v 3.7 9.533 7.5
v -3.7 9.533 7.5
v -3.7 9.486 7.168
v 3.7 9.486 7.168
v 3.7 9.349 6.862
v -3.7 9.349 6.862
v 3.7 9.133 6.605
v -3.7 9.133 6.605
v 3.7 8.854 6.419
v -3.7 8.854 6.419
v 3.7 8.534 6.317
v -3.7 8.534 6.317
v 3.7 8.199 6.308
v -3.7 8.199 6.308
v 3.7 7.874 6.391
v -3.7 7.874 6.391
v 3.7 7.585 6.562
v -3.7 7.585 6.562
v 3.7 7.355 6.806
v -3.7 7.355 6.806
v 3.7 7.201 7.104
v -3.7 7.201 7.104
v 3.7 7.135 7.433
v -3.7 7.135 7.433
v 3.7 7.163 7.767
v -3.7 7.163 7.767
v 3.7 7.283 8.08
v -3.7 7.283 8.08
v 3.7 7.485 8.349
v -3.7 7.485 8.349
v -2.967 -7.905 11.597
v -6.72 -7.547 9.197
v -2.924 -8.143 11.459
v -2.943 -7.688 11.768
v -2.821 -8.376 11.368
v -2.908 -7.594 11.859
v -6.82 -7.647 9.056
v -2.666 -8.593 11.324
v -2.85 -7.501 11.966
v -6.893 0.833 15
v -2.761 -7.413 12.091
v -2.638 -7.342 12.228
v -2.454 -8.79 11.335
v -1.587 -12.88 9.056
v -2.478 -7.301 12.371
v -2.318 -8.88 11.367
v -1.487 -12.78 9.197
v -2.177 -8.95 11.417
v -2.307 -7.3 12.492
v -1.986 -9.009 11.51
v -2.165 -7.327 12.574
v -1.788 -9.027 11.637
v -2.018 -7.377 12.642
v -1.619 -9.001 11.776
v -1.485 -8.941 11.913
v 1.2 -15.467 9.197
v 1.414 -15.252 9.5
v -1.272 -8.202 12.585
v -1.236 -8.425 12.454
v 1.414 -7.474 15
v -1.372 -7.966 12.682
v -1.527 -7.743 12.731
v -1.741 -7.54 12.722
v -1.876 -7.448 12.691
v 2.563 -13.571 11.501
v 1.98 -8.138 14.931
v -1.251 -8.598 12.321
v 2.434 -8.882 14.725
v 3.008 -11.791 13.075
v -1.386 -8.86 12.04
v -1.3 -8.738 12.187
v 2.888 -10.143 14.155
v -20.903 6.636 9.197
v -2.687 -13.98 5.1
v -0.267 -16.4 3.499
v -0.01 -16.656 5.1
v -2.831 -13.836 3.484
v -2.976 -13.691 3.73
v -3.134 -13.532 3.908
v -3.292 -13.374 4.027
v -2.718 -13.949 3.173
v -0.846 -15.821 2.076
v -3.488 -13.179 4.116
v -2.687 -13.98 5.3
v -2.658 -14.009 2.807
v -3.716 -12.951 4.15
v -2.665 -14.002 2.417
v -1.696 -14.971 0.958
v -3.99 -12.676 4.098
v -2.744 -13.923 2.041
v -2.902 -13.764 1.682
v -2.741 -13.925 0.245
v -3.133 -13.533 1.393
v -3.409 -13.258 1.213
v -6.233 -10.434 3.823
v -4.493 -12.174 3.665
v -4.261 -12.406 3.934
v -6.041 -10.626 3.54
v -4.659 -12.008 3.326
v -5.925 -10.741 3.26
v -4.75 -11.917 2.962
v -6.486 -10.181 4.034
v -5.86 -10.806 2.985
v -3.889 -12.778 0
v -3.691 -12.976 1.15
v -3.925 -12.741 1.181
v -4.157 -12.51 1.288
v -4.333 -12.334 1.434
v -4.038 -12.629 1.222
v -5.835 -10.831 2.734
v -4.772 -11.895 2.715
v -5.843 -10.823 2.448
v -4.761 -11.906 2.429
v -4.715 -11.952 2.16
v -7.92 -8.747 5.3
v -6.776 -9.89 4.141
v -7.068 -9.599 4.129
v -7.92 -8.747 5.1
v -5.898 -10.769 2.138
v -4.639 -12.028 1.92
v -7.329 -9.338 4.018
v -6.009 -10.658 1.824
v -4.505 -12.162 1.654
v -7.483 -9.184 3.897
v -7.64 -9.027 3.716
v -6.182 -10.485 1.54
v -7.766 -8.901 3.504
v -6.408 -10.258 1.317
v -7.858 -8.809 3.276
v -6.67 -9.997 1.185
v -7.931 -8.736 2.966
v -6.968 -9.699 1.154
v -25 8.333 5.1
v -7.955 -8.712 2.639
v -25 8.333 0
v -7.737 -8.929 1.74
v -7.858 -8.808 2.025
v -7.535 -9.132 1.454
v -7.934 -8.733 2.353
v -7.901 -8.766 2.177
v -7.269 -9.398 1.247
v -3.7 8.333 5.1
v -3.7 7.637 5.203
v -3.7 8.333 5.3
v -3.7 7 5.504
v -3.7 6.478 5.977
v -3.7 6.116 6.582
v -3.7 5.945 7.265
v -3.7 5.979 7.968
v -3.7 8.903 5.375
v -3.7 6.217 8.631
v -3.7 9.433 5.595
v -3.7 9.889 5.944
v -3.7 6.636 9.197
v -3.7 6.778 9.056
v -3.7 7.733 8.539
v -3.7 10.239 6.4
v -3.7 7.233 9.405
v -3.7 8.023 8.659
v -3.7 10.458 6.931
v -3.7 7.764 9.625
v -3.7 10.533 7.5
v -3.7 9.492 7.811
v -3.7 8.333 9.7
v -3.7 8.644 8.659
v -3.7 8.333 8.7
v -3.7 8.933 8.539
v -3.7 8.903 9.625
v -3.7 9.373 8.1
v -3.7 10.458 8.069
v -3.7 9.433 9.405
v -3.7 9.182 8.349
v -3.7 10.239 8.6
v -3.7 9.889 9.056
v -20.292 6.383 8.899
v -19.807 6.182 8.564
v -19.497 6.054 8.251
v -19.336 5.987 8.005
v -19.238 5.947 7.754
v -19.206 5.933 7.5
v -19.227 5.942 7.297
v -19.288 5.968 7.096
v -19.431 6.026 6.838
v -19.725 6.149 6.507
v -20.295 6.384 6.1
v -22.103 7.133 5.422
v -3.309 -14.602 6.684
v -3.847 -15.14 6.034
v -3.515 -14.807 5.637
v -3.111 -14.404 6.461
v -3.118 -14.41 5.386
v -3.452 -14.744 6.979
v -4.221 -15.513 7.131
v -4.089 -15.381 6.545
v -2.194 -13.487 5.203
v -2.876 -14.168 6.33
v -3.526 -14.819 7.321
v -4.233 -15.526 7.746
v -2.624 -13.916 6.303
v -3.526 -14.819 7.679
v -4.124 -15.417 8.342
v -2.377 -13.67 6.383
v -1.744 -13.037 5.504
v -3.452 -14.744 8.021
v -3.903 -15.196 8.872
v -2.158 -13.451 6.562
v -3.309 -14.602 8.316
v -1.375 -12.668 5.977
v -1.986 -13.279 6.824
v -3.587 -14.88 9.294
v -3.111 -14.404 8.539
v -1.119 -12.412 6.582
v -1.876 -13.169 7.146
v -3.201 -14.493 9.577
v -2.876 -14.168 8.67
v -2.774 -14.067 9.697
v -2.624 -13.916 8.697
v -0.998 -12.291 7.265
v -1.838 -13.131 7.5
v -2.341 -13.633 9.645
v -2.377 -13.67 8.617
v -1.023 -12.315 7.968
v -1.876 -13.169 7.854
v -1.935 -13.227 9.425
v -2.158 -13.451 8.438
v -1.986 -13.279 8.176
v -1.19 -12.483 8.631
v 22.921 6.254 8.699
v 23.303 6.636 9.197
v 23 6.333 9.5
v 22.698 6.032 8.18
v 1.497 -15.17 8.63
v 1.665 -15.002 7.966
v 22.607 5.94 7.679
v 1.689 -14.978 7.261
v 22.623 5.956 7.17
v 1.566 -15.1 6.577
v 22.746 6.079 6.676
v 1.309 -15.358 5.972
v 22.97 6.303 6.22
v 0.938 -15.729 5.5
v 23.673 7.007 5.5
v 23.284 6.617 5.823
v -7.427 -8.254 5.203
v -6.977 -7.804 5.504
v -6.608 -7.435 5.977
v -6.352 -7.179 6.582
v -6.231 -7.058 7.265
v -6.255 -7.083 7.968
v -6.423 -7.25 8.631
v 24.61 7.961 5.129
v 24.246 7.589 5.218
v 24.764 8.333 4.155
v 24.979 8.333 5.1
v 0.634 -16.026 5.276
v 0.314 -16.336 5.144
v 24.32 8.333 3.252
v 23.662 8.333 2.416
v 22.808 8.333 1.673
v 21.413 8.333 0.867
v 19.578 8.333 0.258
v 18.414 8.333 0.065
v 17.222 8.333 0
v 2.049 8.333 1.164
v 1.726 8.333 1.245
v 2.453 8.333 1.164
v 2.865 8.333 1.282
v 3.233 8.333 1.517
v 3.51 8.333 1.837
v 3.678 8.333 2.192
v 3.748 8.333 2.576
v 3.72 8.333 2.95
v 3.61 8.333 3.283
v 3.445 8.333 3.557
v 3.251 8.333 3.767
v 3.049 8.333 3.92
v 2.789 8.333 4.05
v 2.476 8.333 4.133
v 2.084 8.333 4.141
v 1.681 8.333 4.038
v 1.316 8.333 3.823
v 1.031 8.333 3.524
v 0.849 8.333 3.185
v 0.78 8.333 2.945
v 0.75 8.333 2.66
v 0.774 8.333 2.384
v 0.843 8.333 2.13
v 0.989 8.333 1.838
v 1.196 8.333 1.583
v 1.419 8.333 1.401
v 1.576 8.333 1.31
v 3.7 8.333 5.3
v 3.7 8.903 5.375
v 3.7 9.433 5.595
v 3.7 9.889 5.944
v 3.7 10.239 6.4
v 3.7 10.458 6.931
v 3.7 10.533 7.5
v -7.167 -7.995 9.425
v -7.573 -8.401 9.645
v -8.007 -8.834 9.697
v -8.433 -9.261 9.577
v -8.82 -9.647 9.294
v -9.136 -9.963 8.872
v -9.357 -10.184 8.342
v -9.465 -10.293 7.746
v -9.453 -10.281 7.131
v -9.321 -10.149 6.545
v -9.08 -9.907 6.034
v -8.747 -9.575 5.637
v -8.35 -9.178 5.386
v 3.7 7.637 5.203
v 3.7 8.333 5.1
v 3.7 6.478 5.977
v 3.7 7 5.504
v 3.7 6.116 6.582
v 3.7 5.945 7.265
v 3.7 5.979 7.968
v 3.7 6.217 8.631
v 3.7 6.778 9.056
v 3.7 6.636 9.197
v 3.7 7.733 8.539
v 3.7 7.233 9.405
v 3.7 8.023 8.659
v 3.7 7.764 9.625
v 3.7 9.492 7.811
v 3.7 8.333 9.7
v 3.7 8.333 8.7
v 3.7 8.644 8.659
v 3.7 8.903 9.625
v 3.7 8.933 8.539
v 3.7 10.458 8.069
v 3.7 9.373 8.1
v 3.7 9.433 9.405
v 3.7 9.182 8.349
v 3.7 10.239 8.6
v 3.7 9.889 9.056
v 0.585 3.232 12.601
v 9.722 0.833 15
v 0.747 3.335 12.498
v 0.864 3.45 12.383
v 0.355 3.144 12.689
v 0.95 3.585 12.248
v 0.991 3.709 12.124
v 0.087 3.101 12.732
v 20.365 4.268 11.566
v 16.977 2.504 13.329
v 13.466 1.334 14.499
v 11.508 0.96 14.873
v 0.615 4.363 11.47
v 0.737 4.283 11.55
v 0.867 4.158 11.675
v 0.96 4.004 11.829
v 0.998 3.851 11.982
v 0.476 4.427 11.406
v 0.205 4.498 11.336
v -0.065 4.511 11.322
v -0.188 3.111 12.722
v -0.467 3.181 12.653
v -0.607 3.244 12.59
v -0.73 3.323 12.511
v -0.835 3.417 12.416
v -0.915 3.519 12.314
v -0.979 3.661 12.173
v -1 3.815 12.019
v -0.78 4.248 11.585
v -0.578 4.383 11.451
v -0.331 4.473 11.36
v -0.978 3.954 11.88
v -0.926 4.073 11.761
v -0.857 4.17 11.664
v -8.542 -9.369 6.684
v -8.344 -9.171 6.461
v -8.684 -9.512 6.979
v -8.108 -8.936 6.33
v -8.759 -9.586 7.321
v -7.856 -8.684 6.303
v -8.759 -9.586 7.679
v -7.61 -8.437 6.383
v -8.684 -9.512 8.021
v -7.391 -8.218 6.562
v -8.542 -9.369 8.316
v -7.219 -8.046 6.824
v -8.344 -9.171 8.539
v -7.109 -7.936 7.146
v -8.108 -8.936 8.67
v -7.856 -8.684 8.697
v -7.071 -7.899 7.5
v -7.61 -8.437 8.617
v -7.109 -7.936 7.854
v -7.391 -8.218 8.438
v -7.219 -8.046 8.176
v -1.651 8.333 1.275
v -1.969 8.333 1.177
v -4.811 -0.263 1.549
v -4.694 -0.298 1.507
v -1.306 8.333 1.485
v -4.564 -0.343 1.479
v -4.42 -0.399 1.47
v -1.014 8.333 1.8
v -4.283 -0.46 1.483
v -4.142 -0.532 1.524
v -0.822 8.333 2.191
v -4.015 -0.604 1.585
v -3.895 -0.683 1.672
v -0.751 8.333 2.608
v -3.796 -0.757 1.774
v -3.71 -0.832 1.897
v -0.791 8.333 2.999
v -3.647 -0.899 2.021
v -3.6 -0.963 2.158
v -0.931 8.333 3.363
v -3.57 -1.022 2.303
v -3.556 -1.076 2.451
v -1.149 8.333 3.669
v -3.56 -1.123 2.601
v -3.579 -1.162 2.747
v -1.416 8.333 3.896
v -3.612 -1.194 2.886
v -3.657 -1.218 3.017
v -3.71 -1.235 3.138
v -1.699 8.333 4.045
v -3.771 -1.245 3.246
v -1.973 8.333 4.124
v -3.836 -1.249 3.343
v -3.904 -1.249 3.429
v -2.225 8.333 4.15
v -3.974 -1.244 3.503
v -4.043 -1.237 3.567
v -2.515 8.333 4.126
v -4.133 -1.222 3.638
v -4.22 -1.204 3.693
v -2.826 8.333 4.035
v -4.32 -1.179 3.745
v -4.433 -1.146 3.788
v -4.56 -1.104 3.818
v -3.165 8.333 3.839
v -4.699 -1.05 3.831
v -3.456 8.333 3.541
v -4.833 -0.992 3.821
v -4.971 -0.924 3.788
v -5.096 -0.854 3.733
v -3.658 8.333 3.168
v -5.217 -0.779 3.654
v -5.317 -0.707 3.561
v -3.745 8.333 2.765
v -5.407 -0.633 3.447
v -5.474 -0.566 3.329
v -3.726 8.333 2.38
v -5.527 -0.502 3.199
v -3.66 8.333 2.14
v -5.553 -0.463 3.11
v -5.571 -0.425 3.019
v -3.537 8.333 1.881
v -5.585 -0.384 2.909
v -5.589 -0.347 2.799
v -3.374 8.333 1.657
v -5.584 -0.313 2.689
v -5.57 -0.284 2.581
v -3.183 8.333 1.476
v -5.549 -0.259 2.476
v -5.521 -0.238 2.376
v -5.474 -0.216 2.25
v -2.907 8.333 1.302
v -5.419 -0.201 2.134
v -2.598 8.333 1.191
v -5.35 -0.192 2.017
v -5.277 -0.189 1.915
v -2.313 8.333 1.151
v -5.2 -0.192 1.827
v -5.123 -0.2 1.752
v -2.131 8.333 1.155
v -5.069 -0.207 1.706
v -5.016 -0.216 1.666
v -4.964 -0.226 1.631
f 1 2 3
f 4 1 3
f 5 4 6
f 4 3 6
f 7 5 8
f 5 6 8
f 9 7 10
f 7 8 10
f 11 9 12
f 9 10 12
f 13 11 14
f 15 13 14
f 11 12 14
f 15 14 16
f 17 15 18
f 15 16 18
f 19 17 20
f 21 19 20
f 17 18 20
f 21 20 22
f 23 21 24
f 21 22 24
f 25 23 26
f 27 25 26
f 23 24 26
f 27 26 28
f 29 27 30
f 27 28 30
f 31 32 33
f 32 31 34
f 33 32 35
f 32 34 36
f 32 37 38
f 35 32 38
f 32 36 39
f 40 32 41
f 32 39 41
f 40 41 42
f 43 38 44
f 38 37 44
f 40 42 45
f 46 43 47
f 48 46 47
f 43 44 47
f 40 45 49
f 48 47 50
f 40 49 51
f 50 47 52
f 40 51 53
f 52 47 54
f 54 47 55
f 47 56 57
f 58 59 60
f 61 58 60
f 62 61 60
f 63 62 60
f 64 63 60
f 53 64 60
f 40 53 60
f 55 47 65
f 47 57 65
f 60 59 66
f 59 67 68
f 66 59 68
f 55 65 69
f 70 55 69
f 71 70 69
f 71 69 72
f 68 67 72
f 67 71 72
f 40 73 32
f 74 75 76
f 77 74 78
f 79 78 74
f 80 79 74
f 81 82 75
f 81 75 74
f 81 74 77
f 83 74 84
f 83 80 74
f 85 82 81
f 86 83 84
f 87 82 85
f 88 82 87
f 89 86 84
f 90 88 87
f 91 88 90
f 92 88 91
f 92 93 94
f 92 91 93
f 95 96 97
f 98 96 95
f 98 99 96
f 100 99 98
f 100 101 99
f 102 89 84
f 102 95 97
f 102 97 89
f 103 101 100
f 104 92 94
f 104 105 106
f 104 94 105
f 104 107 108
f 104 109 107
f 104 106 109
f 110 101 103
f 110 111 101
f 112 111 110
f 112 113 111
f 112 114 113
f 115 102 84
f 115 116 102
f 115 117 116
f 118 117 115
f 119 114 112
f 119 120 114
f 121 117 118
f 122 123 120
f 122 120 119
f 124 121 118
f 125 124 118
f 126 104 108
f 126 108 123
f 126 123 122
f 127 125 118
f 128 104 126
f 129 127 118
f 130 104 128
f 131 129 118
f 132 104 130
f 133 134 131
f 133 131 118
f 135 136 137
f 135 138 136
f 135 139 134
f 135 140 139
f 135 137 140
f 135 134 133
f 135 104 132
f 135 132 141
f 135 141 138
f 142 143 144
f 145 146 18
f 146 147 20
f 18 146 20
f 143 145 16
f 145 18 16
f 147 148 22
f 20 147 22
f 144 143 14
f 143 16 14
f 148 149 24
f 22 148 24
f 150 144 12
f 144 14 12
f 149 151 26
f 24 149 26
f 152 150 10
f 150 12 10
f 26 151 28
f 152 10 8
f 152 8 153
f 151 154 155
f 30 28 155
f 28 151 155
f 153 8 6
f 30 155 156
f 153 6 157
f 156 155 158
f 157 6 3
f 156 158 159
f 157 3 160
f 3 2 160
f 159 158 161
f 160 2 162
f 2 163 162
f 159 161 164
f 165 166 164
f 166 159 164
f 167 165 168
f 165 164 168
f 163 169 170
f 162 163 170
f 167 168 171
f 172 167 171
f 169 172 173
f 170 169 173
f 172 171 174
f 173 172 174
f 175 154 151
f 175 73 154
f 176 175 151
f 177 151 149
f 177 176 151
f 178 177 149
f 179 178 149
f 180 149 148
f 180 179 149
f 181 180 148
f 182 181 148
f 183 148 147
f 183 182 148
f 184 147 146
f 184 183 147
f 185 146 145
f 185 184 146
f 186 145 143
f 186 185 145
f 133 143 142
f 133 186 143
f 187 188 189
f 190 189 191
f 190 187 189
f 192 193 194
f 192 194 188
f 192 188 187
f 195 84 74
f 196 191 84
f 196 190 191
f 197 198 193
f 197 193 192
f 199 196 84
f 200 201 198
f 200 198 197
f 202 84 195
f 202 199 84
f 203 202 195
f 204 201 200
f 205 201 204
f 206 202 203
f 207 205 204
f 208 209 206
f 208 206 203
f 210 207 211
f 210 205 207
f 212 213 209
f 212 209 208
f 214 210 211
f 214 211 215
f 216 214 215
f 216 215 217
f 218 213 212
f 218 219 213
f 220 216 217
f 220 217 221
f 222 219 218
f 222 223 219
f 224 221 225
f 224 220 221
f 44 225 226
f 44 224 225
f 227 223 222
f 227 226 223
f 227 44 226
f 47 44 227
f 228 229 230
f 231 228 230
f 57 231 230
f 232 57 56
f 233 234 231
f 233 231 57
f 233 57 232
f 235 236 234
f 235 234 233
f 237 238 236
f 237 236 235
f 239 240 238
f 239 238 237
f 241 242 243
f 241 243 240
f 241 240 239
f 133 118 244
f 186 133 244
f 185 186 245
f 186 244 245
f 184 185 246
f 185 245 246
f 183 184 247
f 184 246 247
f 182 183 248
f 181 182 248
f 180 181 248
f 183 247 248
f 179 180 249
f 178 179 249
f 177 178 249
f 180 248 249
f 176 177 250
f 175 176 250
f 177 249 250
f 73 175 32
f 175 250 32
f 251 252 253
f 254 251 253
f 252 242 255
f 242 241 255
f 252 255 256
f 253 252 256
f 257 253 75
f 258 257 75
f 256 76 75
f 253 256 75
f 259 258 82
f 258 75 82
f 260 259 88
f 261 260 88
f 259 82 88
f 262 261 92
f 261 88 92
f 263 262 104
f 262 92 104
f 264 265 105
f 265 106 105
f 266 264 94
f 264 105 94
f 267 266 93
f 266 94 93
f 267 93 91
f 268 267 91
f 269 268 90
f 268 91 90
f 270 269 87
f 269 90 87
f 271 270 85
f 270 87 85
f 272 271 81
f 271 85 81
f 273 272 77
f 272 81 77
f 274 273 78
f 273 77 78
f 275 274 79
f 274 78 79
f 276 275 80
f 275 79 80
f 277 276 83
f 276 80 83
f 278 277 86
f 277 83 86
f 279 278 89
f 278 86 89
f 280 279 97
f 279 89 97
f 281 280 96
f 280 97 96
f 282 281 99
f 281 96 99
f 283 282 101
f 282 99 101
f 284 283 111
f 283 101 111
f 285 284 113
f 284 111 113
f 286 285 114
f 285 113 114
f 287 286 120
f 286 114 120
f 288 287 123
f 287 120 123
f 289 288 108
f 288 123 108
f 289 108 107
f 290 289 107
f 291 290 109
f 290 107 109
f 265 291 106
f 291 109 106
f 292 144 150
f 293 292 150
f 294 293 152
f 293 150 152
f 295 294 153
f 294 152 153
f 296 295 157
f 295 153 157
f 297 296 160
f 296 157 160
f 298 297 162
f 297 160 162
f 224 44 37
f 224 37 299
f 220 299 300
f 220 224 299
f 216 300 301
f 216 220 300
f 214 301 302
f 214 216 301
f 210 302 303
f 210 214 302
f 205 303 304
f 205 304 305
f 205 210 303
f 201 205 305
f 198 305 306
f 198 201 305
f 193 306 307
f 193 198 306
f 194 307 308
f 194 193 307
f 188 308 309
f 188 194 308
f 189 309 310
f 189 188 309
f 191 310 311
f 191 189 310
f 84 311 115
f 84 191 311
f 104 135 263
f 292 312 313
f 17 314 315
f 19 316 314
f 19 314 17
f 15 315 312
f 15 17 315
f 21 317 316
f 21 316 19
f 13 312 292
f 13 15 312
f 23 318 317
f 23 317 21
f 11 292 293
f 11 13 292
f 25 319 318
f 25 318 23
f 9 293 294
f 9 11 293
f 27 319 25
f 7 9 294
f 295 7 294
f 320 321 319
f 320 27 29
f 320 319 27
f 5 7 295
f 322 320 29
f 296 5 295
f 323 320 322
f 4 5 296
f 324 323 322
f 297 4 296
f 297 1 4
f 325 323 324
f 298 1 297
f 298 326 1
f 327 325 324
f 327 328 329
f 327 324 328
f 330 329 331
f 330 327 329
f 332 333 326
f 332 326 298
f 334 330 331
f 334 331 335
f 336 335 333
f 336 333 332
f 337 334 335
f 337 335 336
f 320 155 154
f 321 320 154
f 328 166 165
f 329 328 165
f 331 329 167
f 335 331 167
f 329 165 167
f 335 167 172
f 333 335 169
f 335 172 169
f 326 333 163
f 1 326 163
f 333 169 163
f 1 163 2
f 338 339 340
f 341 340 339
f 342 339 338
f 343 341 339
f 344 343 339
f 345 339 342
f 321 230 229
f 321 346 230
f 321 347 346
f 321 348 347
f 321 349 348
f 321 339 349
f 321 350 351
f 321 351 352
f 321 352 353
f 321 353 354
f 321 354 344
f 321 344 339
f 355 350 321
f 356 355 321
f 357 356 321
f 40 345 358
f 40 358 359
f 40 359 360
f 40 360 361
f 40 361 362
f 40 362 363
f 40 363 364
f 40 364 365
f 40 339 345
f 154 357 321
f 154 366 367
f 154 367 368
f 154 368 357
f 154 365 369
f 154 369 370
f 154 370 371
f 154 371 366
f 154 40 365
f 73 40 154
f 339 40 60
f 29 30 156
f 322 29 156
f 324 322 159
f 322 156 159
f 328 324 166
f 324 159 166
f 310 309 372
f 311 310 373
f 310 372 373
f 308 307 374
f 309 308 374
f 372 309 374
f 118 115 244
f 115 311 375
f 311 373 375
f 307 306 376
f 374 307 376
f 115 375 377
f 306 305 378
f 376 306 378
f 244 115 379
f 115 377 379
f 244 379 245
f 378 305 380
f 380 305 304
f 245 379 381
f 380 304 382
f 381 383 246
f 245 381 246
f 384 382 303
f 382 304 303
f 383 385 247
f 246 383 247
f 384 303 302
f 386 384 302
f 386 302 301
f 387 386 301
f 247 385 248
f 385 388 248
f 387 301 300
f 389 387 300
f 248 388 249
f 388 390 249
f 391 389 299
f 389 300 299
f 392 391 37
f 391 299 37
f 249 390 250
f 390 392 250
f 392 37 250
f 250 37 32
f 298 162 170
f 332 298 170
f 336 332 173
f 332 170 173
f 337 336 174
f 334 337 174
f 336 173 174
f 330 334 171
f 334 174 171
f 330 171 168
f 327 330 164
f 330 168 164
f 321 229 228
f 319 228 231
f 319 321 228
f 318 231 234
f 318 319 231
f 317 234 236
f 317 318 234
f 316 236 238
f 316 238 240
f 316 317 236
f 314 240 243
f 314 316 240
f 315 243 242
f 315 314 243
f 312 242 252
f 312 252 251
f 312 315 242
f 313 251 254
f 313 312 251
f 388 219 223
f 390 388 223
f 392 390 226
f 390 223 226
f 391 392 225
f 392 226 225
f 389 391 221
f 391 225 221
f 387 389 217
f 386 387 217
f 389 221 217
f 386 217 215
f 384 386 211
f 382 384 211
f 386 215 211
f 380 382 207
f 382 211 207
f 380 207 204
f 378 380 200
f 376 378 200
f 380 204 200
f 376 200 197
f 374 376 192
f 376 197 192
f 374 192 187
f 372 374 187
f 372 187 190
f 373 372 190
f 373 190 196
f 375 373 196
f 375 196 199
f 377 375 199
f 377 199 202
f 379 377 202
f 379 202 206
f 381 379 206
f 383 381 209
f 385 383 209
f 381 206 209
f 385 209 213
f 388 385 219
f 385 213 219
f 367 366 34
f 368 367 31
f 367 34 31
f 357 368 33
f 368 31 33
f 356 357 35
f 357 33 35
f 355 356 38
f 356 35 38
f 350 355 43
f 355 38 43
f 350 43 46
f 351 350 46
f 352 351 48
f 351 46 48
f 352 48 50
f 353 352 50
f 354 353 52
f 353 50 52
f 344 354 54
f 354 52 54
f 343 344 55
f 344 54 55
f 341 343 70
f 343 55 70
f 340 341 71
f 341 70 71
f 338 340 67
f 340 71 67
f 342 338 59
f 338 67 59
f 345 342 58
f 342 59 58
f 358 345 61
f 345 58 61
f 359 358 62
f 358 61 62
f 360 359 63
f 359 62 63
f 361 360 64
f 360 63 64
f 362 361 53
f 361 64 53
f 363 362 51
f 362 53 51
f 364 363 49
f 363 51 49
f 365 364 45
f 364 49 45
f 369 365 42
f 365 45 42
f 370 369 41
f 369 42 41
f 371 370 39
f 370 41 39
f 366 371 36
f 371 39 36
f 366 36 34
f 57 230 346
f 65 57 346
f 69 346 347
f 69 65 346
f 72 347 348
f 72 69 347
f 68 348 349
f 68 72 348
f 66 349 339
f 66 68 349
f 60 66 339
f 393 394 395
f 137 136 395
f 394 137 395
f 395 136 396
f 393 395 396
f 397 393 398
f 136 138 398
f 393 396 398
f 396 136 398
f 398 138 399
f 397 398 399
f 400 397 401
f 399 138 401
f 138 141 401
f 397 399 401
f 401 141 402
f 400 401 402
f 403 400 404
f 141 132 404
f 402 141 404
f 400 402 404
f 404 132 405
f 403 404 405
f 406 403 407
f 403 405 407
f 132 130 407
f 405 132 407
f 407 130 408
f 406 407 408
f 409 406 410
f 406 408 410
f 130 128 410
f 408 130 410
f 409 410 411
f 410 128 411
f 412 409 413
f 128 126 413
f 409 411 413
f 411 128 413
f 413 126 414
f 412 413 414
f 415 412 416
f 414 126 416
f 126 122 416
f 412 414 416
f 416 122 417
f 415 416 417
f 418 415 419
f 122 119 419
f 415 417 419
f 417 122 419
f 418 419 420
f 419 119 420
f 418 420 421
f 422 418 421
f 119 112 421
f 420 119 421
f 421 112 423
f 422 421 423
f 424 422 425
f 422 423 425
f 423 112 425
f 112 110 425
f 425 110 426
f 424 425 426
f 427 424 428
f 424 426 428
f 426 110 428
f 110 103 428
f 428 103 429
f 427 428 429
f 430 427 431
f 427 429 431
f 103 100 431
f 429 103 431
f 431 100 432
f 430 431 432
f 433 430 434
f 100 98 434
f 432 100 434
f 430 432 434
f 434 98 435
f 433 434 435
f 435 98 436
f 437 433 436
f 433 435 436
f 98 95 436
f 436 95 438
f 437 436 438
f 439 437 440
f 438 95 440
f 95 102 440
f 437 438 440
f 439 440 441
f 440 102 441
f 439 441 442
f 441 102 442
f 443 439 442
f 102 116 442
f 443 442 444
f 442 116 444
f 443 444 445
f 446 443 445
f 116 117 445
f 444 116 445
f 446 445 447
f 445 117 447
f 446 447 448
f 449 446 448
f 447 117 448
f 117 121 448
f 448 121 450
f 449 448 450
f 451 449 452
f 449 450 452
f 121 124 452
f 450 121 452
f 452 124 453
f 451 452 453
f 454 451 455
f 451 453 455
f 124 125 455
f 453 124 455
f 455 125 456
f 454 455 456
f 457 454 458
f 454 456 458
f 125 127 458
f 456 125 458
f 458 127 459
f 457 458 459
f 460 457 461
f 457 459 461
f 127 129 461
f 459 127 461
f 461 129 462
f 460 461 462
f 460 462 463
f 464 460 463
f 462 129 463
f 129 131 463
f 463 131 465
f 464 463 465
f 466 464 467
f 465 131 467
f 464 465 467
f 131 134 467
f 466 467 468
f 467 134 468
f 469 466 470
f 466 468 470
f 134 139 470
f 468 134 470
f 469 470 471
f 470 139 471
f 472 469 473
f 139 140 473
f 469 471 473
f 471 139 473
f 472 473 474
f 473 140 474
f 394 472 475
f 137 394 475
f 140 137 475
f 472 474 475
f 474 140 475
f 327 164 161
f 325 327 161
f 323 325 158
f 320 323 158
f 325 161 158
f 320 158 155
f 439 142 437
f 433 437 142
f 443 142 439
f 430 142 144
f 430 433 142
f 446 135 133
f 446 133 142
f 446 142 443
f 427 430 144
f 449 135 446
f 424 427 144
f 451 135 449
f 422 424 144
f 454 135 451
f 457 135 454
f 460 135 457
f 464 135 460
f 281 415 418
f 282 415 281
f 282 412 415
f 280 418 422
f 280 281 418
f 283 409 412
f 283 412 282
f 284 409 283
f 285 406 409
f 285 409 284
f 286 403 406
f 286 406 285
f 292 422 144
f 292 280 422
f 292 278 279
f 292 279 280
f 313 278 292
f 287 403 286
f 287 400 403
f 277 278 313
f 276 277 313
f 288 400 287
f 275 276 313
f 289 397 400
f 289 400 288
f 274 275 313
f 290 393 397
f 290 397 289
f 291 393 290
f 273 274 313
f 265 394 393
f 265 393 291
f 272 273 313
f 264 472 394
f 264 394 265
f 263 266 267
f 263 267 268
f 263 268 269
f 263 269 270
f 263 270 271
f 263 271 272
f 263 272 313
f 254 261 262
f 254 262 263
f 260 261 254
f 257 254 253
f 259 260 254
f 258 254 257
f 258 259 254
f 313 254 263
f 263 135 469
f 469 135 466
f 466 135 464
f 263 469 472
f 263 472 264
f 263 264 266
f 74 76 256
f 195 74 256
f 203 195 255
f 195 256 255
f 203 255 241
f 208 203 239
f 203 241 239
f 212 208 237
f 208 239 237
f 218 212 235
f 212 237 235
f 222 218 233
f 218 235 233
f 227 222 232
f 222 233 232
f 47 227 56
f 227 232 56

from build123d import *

# Parameters (mm, degrees)
BOSS_EXTRUDE1_DEPTH      = 15
CUT_EXTRUDE1_DEPTH       = 34.582402799
CUT_EXTRUDE1_DEPTH_BACK  = 34.582402799
SKETCH2_R                = 2.4
BOSS_EXTRUDE2_DEPTH      = 3.7
BOSS_EXTRUDE2_DEPTH_BACK = 3.7
SKETCH4_R                = 2.4
SKETCH4_R_2              = 2.2
SKETCH4_R_3              = 1.2
CUT_EXTRUDE2_DEPTH       = 42.134683932
BOSS_EXTRUDE3_START      = -3.8
SKETCH4_3_R              = 1.2
BOSS_EXTRUDE3_DEPTH      = 7.4
FILLET1_R                = 5.5
FILLET2_R                = 5.5


with BuildPart() as part:
    # Sketch1 → Boss-Extrude1 (new body)
    with BuildSketch(Plane(origin=(0, 0, 0), x_dir=(0, 1, 0), z_dir=(0, 0, 1))):
        Polygon((8.333333333, 25), (8.333333333, -25), (-16.666666667, 0), align=None)
    extrude(amount=BOSS_EXTRUDE1_DEPTH)

    # Sketch2 → Cut-Extrude1 (cut, two sides: drawn at the far end of the back side and taken through both)
    with BuildSketch(Plane.YZ.offset(-CUT_EXTRUDE1_DEPTH_BACK)):
        with Locations((8.333333333, 7.5)):
            Circle(SKETCH2_R)
        Polygon((8.333333333, 7.5), (8.333333333, 15), (0.833333333, 15), align=None)
        with BuildLine():
            ThreePointArc((8.333333333, 9.9), (7.414893096, 9.717310878), (6.636277058, 9.197056275))
            Line((6.636277058, 9.197056275), (6.777698415, 9.055634919))
            ThreePointArc((6.777698415, 9.055634919), (7.491429782, 9.532534972), (8.333333333, 9.7))
            Line((8.333333333, 9.7), (8.333333333, 9.9))
        make_face()
        with BuildLine():
            ThreePointArc((8.333333333, 9.7), (7.491429782, 9.532534972), (6.777698415, 9.055634919))
            Line((6.777698415, 9.055634919), (7.484805196, 8.348528137))
            ThreePointArc((7.484805196, 8.348528137), (7.874113214, 8.608655439), (8.333333333, 8.7))
            Line((8.333333333, 8.7), (8.333333333, 9.7))
        make_face()
        with BuildLine():
            Line((7.484805196, 8.348528137), (6.777698415, 9.055634919))
            ThreePointArc((6.777698415, 9.055634919), (6.300798362, 6.658096449), (8.333333333, 5.3))
            ThreePointArc((8.333333333, 5.3), (9.888968252, 5.944365081), (10.533333333, 7.5))
            ThreePointArc((10.533333333, 7.5), (9.888968252, 9.055634919), (8.333333333, 9.7))
            Line((8.333333333, 9.7), (8.333333333, 8.7))
            ThreePointArc((8.333333333, 8.7), (9.181861471, 8.348528137), (9.533333333, 7.5))
            ThreePointArc((9.533333333, 7.5), (7.874113214, 6.391344561), (7.484805196, 8.348528137))
        make_face()
        with BuildLine():
            ThreePointArc((8.333333333, 8.7), (7.874113214, 8.608655439), (7.484805196, 8.348528137))
            Line((7.484805196, 8.348528137), (8.333333333, 7.5))
            Line((8.333333333, 7.5), (8.333333333, 8.7))
        make_face()
        with BuildLine():
            Line((8.333333333, 7.5), (7.484805196, 8.348528137))
            ThreePointArc((7.484805196, 8.348528137), (7.874113214, 6.391344561), (9.533333333, 7.5))
            ThreePointArc((9.533333333, 7.5), (9.181861471, 8.348528137), (8.333333333, 8.7))
            Line((8.333333333, 8.7), (8.333333333, 7.5))
        make_face()
    extrude(amount=CUT_EXTRUDE1_DEPTH + CUT_EXTRUDE1_DEPTH_BACK, mode=Mode.SUBTRACT)

    # Sketch2<5> → Boss-Extrude2 (add, two sides: drawn at the far end of the back side and taken through both)
    with BuildSketch(Plane.YZ.offset(-BOSS_EXTRUDE2_DEPTH_BACK)):
        with BuildLine():
            Line((6.777698415, 9.055634919), (6.636277058, 9.197056275))
            ThreePointArc((6.636277058, 9.197056275), (6.116022455, 6.581559762), (8.333333333, 5.1))
            Line((8.333333333, 5.1), (8.333333333, 5.3))
            ThreePointArc((8.333333333, 5.3), (6.300798362, 6.658096449), (6.777698415, 9.055634919))
        make_face()
        with BuildLine():
            ThreePointArc((8.333333333, 9.7), (7.491429782, 9.532534972), (6.777698415, 9.055634919))
            Line((6.777698415, 9.055634919), (7.484805196, 8.348528137))
            ThreePointArc((7.484805196, 8.348528137), (7.874113214, 8.608655439), (8.333333333, 8.7))
            Line((8.333333333, 8.7), (8.333333333, 9.7))
        make_face()
        with BuildLine():
            Line((7.484805196, 8.348528137), (6.777698415, 9.055634919))
            ThreePointArc((6.777698415, 9.055634919), (6.300798362, 6.658096449), (8.333333333, 5.3))
            ThreePointArc((8.333333333, 5.3), (9.888968252, 5.944365081), (10.533333333, 7.5))
            ThreePointArc((10.533333333, 7.5), (9.888968252, 9.055634919), (8.333333333, 9.7))
            Line((8.333333333, 9.7), (8.333333333, 8.7))
            ThreePointArc((8.333333333, 8.7), (9.181861471, 8.348528137), (9.533333333, 7.5))
            ThreePointArc((9.533333333, 7.5), (7.874113214, 6.391344561), (7.484805196, 8.348528137))
        make_face()
    extrude(amount=BOSS_EXTRUDE2_DEPTH + BOSS_EXTRUDE2_DEPTH_BACK)

    # Sketch4 → Cut-Extrude2 (cut, through all)
    # profile 1 of 3: a face of its own
    with BuildSketch(Plane(origin=(8.333333333, -8.333333333, 0), x_dir=(0.7071067811865486, 0.7071067811865465, 0), z_dir=(0.7071067811865465, -0.7071067811865486, 0))):
        with Locations((-11.78511302, 7.5)):
            Circle(SKETCH4_R)
        with Locations((-11.78511302, 7.5)):
            Circle(SKETCH4_R_2, mode=Mode.SUBTRACT)
    # profile 2 of 3: a face of its own
    with BuildSketch(Plane(origin=(8.333333333, -8.333333333, 0), x_dir=(0.7071067811865486, 0.7071067811865465, 0), z_dir=(0.7071067811865465, -0.7071067811865486, 0))):
        with Locations((-11.78511302, 7.5)):
            Circle(SKETCH4_R_3)
    # profile 3 of 3: a face of its own
    with BuildSketch(Plane(origin=(8.333333333, -8.333333333, 0), x_dir=(0.7071067811865486, 0.7071067811865465, 0), z_dir=(0.7071067811865465, -0.7071067811865486, 0))):
        Polygon((-11.78511302, 7.5), (-4.28511302, 15), (-11.78511302, 15), align=None)
    extrude(amount=-CUT_EXTRUDE2_DEPTH, mode=Mode.SUBTRACT)


with BuildPart() as cut_extrude2_kept_piece:
    # of the separate pieces the step leaves, the one the design keeps (cut_extrude2_pieces_kept)
    add(part.part.solids().sort_by_distance((-25, 8.333333333, 0))[0])

    # Sketch4<3> → Boss-Extrude3 (add)
    with BuildSketch(Plane(origin=(8.333333333, -8.333333333, 0), x_dir=(0.7071067811865486, 0.7071067811865465, 0), z_dir=(0.7071067811865465, -0.7071067811865486, 0)).offset(BOSS_EXTRUDE3_START)):
        with BuildLine():
            Line((-11.78511302, 5.3), (-11.78511302, 5.1))
            ThreePointArc((-11.78511302, 5.1), (-9.567802142, 6.581559762), (-10.088056745, 9.197056275))
            Line((-10.088056745, 9.197056275), (-10.229478101, 9.055634919))
            ThreePointArc((-10.229478101, 9.055634919), (-13.817647991, 8.341903551), (-11.78511302, 5.3))
        make_face()
        with Locations((-11.78511302, 7.5)):
            Circle(SKETCH4_3_R, mode=Mode.SUBTRACT)
    extrude(amount=-BOSS_EXTRUDE3_DEPTH)

    # Fillet1
    fillet1_edges = [cut_extrude2_kept_piece.edges().sort_by_distance(p)[0] for p in [
        (12.5, -4.166666667, 0),
    ]]
    fillet(fillet1_edges, radius=FILLET1_R)

    # Fillet2
    fillet2_edges = [cut_extrude2_kept_piece.edges().sort_by_distance(p)[0] for p in [
        (11.401650429, -5.265016237, 15),
    ]]
    fillet(fillet2_edges, radius=FILLET2_R)

    # Cut-Loft1: read off the stored shape, not the designer's step
    # Cut-Loft1: loft between two sections, ruled curve by curve
    cut_loft1_from = [
        Edge.make_bspline([(-0.780037402, 4.247975845, 11.585357488), (-0.727892994, 4.29393999, 11.539393344), (-0.661002861, 4.341451036, 11.491882298), (-0.486258531, 4.427982909, 11.405350424), (-0.37773802, 4.466988385, 11.366344948), (-0.119442352, 4.513863, 11.319470333), (0.030886977, 4.520936001, 11.312397333), (0.339194689, 4.479887019, 11.353446314), (0.495726658, 4.430828939, 11.402504394), (0.755739125, 4.283342282, 11.549991051), (0.85742023, 4.185934374, 11.647398959), (0.980967134, 3.982022818, 11.851310515), (1.003811506, 3.876720642, 11.956612691), (0.995127807, 3.688258836, 12.145074497), (0.964819046, 3.604889374, 12.22844396), (0.883263184, 3.465498283, 12.367835051), (0.832181809, 3.409020048, 12.424313286), (0.727892994, 3.317091758, 12.516241575), (0.661002861, 3.269580712, 12.563752621), (0.486258531, 3.183048839, 12.650284494), (0.37773802, 3.144043363, 12.68928997), (0.119442352, 3.097168748, 12.736164585), (-0.030886977, 3.090095747, 12.743237586), (-0.339194689, 3.131144729, 12.702188605), (-0.495726658, 3.180202809, 12.653130524), (-0.755739125, 3.327689466, 12.505643867), (-0.85742023, 3.425097374, 12.40823596), (-0.980967134, 3.62900893, 12.204324403), (-1.003811506, 3.734311106, 12.099022227), (-0.995127807, 3.922772912, 11.910560421), (-0.964819046, 4.006142375, 11.827190959), (-0.883263184, 4.145533465, 11.687799868), (-0.832181809, 4.2020117, 11.631321633), (-0.780037402, 4.247975845, 11.585357488)], [0, 0, 0, 0, 0.0625, 0.0625, 0.125, 0.125, 0.1875, 0.1875, 0.25, 0.25, 0.3125, 0.3125, 0.375, 0.375, 0.4375, 0.4375, 0.5, 0.5, 0.5625, 0.5625, 0.625, 0.625, 0.6875, 0.6875, 0.75, 0.75, 0.8125, 0.8125, 0.875, 0.875, 0.9375, 0.9375, 1, 1, 1, 1], 3),
    ]
    cut_loft1_to = [
        Edge.make_bspline([(-2.942962207, -7.687612903, 11.768161272), (-2.960079955, -7.748006682, 11.713352345), (-2.97091826, -7.821128364, 11.653983669), (-2.962732482, -7.997871839, 11.534795379), (-2.943341865, -8.102036376, 11.474851165), (-2.852553416, -8.332500848, 11.376085302), (-2.780090013, -8.458954557, 11.33790839), (-2.577527193, -8.697189205, 11.312684599), (-2.447282041, -8.807423656, 11.326834302), (-2.166844782, -8.965457814, 11.413386364), (-2.018593417, -9.01216386, 11.485189748), (-1.75537809, -9.036408091, 11.65416783), (-1.641064457, -9.015208413, 11.749990212), (-1.462633136, -8.936456733, 11.931846055), (-1.397668226, -8.879828871, 12.017825129), (-1.30534529, -8.759724839, 12.168033678), (-1.2774564, -8.696211634, 12.23266472), (-1.243220903, -8.575424074, 12.342282574), (-1.232382599, -8.502302392, 12.40165125), (-1.240568377, -8.325558918, 12.52083954), (-1.259958994, -8.221394381, 12.580783753), (-1.350747443, -7.990929909, 12.679549617), (-1.423210846, -7.8644762, 12.717726528), (-1.625773666, -7.626241552, 12.74295032), (-1.756018818, -7.516007101, 12.728800617), (-2.036456077, -7.357972942, 12.642248555), (-2.184707442, -7.311266897, 12.570445171), (-2.447922769, -7.287022665, 12.401467089), (-2.562236402, -7.308222344, 12.305644707), (-2.740667723, -7.386974024, 12.123788863), (-2.805632633, -7.443601886, 12.037809789), (-2.897955569, -7.563705918, 11.88760124), (-2.925844458, -7.627219123, 11.822970199), (-2.942962207, -7.687612903, 11.768161272)], [0, 0, 0, 0, 0.0625, 0.0625, 0.125, 0.125, 0.1875, 0.1875, 0.25, 0.25, 0.3125, 0.3125, 0.375, 0.375, 0.4375, 0.4375, 0.5, 0.5, 0.5625, 0.5625, 0.625, 0.625, 0.6875, 0.6875, 0.75, 0.75, 0.8125, 0.8125, 0.875, 0.875, 0.9375, 0.9375, 1, 1, 1, 1], 3),
    ]
    cut_loft1 = Solid(Shell([*[Face.make_surface_from_curves(cut_loft1_from[k], cut_loft1_to[k]) for k in range(1)], Face(Wire(cut_loft1_from)), Face(Wire(cut_loft1_to))]))
    add(cut_loft1, mode=Mode.SUBTRACT)

    # Cut-Loft2: read off the stored shape, not the designer's step
    # Cut-Loft2: loft between two sections, ruled curve by curve
    cut_loft2_from = [
        Edge.make_bspline([(-1.968928028, 8.333333333, 1.176569124), (-1.846142122, 8.333333333, 1.199991788), (-1.710094901, 8.333333333, 1.241418272), (-1.425125623, 8.333333333, 1.38699475), (-1.275764099, 8.333333333, 1.492043002), (-1.006403694, 8.333333333, 1.787753963), (-0.887507445, 8.333333333, 1.979942272), (-0.747782094, 8.333333333, 2.429308619), (-0.729723795, 8.333333333, 2.685500159), (-0.823414453, 8.333333333, 3.176643785), (-0.934515031, 8.333333333, 3.408196952), (-1.229851161, 8.333333333, 3.774570882), (-1.411147334, 8.333333333, 3.909494424), (-1.77045077, 8.333333333, 4.085281344), (-1.947994443, 8.333333333, 4.127969094), (-2.266542452, 8.333333333, 4.158418492), (-2.408286066, 8.333333333, 4.14685354), (-2.653857878, 8.333333333, 4.100008212), (-2.789905099, 8.333333333, 4.058581728), (-3.074874377, 8.333333333, 3.91300525), (-3.224235901, 8.333333333, 3.807956998), (-3.493596306, 8.333333333, 3.512246037), (-3.612492555, 8.333333333, 3.320057728), (-3.752217906, 8.333333333, 2.870691381), (-3.770276205, 8.333333333, 2.614499841), (-3.676585547, 8.333333333, 2.123356215), (-3.565484969, 8.333333333, 1.891803048), (-3.270148839, 8.333333333, 1.525429118), (-3.088852666, 8.333333333, 1.390505576), (-2.72954923, 8.333333333, 1.214718656), (-2.552005557, 8.333333333, 1.172030906), (-2.233457548, 8.333333333, 1.141581508), (-2.091713934, 8.333333333, 1.15314646), (-1.968928028, 8.333333333, 1.176569124)], [0, 0, 0, 0, 0.0625, 0.0625, 0.125, 0.125, 0.1875, 0.1875, 0.25, 0.25, 0.3125, 0.3125, 0.375, 0.375, 0.4375, 0.4375, 0.5, 0.5, 0.5625, 0.5625, 0.625, 0.625, 0.6875, 0.6875, 0.75, 0.75, 0.8125, 0.8125, 0.875, 0.875, 0.9375, 0.9375, 1, 1, 1, 1], 3),
    ]
    cut_loft2_to = [
        Edge.make_bspline([(-7.858496611, -8.808170056, 2.025007577), (-7.821668579, -8.844998088, 1.911374869), (-7.770238094, -8.896428573, 1.789166807), (-7.622134315, -9.044532352, 1.547235947), (-7.524770004, -9.141896663, 1.42730104), (-7.276217363, -9.390449303, 1.236400098), (-7.124167816, -9.542498851, 1.166869281), (-6.792014211, -9.874652456, 1.138562872), (-6.613055651, -10.053611015, 1.182242109), (-6.29165382, -10.375012847, 1.390572917), (-6.151434782, -10.515231885, 1.553782752), (-5.949772196, -10.71689447, 1.928105728), (-5.887761452, -10.778905215, 2.136389187), (-5.827768334, -10.838898333, 2.527287706), (-5.828454974, -10.838211693, 2.709888519), (-5.861368337, -10.80529833, 3.026485141), (-5.893257591, -10.773409076, 3.161359716), (-5.966913654, -10.699753013, 3.388625131), (-6.018344139, -10.648322528, 3.510833193), (-6.166447918, -10.500218749, 3.752764053), (-6.263812229, -10.402854437, 3.87269896), (-6.51236487, -10.154301797, 4.063599902), (-6.664414418, -10.002252249, 4.133130719), (-6.996568022, -9.670098644, 4.161437128), (-7.175526582, -9.491140085, 4.117757891), (-7.496928413, -9.169738254, 3.909427083), (-7.637147451, -9.029519216, 3.746217248), (-7.838810037, -8.82785663, 3.371894272), (-7.900820782, -8.765845885, 3.163610813), (-7.960813899, -8.705852767, 2.772712294), (-7.960127259, -8.706539408, 2.590111481), (-7.927213896, -8.73945277, 2.273514859), (-7.895324643, -8.771342024, 2.138640284), (-7.858496611, -8.808170056, 2.025007577)], [0, 0, 0, 0, 0.0625, 0.0625, 0.125, 0.125, 0.1875, 0.1875, 0.25, 0.25, 0.3125, 0.3125, 0.375, 0.375, 0.4375, 0.4375, 0.5, 0.5, 0.5625, 0.5625, 0.625, 0.625, 0.6875, 0.6875, 0.75, 0.75, 0.8125, 0.8125, 0.875, 0.875, 0.9375, 0.9375, 1, 1, 1, 1], 3),
    ]
    cut_loft2 = Solid(Shell([*[Face.make_surface_from_curves(cut_loft2_from[k], cut_loft2_to[k]) for k in range(1)], Face(Wire(cut_loft2_from)), Face(Wire(cut_loft2_to))]))
    add(cut_loft2, mode=Mode.SUBTRACT)

    # Cut-Loft3: read off the stored shape, not the designer's step
    # Cut-Loft3: loft between two sections, ruled curve by curve
    cut_loft3_from = [
        Edge.make_bspline([(1.725964289, 8.333333333, 1.244515538), (1.843087995, 8.333333333, 1.200845895), (1.980888558, 8.333333333, 1.165689038), (2.300034176, 8.333333333, 1.142320796), (2.482220909, 8.333333333, 1.154649389), (2.865903308, 8.333333333, 1.267732618), (3.067247697, 8.333333333, 1.370363519), (3.419808921, 8.333333333, 1.682058674), (3.568145177, 8.333333333, 1.891716879), (3.742823747, 8.333333333, 2.3602117), (3.767957213, 8.333333333, 2.615806137), (3.705519566, 8.333333333, 3.082233867), (3.620514732, 8.333333333, 3.291630244), (3.40452376, 8.333333333, 3.628302043), (3.274880341, 8.333333333, 3.756896692), (3.018339523, 8.333333333, 3.948173478), (2.891159416, 8.333333333, 4.01181482), (2.656912005, 8.333333333, 4.099154105), (2.519111442, 8.333333333, 4.134310962), (2.199965824, 8.333333333, 4.157679204), (2.017779091, 8.333333333, 4.145350611), (1.634096692, 8.333333333, 4.032267382), (1.432752303, 8.333333333, 3.929636481), (1.080191079, 8.333333333, 3.617941326), (0.931854823, 8.333333333, 3.408283121), (0.757176253, 8.333333333, 2.9397883), (0.732042787, 8.333333333, 2.684193863), (0.794480434, 8.333333333, 2.217766133), (0.879485268, 8.333333333, 2.008369756), (1.09547624, 8.333333333, 1.671697957), (1.225119659, 8.333333333, 1.543103308), (1.481660477, 8.333333333, 1.351826522), (1.608840584, 8.333333333, 1.28818518), (1.725964289, 8.333333333, 1.244515538)], [0, 0, 0, 0, 0.0625, 0.0625, 0.125, 0.125, 0.1875, 0.1875, 0.25, 0.25, 0.3125, 0.3125, 0.375, 0.375, 0.4375, 0.4375, 0.5, 0.5, 0.5625, 0.5625, 0.625, 0.625, 0.6875, 0.6875, 0.75, 0.75, 0.8125, 0.8125, 0.875, 0.875, 0.9375, 0.9375, 1, 1, 1, 1], 3),
    ]
    cut_loft3_to = [
        Edge.make_bspline([(-3.92544087, -12.741225796, 1.180595026), (-3.838855352, -12.827811315, 1.155477383), (-3.738750093, -12.927916573, 1.141954276), (-3.513226542, -13.153440125, 1.167997613), (-3.387278969, -13.279387698, 1.208227176), (-3.131519199, -13.535147468, 1.379030806), (-3.002016946, -13.664649721, 1.511435479), (-2.789621766, -13.8770449, 1.873692104), (-2.708806091, -13.957860575, 2.103687454), (-2.637762668, -14.028903998, 2.593489112), (-2.64802657, -14.018640096, 2.849905789), (-2.742425753, -13.924240913, 3.301160568), (-2.824611611, -13.842055055, 3.494973968), (-3.012169695, -13.654496971, 3.79437993), (-3.116747407, -13.54991926, 3.901482706), (-3.316808995, -13.349857671, 4.050984282), (-3.412594814, -13.254071853, 4.094287331), (-3.585765851, -13.080900816, 4.144522617), (-3.685871109, -12.980795558, 4.158045724), (-3.911394661, -12.755272006, 4.132002387), (-4.037342234, -12.629324433, 4.091772824), (-4.293102004, -12.373564663, 3.920969194), (-4.422604256, -12.24406241, 3.788564521), (-4.634999436, -12.03166723, 3.426307896), (-4.715815111, -11.950851556, 3.196312546), (-4.786858534, -11.879808133, 2.706510888), (-4.776594632, -11.890072034, 2.450094211), (-4.682195449, -11.984471218, 1.998839432), (-4.600009591, -12.066657075, 1.805026032), (-4.412451507, -12.25421516, 1.50562007), (-4.307873796, -12.358792871, 1.398517294), (-4.107812207, -12.55885446, 1.249015718), (-4.012026389, -12.654640278, 1.205712669), (-3.92544087, -12.741225796, 1.180595026)], [0, 0, 0, 0, 0.0625, 0.0625, 0.125, 0.125, 0.1875, 0.1875, 0.25, 0.25, 0.3125, 0.3125, 0.375, 0.375, 0.4375, 0.4375, 0.5, 0.5, 0.5625, 0.5625, 0.625, 0.625, 0.6875, 0.6875, 0.75, 0.75, 0.8125, 0.8125, 0.875, 0.875, 0.9375, 0.9375, 1, 1, 1, 1], 3),
    ]
    cut_loft3 = Solid(Shell([*[Face.make_surface_from_curves(cut_loft3_from[k], cut_loft3_to[k]) for k in range(1)], Face(Wire(cut_loft3_from)), Face(Wire(cut_loft3_to))]))
    add(cut_loft3, mode=Mode.SUBTRACT)


solid = cut_extrude2_kept_piece.part
